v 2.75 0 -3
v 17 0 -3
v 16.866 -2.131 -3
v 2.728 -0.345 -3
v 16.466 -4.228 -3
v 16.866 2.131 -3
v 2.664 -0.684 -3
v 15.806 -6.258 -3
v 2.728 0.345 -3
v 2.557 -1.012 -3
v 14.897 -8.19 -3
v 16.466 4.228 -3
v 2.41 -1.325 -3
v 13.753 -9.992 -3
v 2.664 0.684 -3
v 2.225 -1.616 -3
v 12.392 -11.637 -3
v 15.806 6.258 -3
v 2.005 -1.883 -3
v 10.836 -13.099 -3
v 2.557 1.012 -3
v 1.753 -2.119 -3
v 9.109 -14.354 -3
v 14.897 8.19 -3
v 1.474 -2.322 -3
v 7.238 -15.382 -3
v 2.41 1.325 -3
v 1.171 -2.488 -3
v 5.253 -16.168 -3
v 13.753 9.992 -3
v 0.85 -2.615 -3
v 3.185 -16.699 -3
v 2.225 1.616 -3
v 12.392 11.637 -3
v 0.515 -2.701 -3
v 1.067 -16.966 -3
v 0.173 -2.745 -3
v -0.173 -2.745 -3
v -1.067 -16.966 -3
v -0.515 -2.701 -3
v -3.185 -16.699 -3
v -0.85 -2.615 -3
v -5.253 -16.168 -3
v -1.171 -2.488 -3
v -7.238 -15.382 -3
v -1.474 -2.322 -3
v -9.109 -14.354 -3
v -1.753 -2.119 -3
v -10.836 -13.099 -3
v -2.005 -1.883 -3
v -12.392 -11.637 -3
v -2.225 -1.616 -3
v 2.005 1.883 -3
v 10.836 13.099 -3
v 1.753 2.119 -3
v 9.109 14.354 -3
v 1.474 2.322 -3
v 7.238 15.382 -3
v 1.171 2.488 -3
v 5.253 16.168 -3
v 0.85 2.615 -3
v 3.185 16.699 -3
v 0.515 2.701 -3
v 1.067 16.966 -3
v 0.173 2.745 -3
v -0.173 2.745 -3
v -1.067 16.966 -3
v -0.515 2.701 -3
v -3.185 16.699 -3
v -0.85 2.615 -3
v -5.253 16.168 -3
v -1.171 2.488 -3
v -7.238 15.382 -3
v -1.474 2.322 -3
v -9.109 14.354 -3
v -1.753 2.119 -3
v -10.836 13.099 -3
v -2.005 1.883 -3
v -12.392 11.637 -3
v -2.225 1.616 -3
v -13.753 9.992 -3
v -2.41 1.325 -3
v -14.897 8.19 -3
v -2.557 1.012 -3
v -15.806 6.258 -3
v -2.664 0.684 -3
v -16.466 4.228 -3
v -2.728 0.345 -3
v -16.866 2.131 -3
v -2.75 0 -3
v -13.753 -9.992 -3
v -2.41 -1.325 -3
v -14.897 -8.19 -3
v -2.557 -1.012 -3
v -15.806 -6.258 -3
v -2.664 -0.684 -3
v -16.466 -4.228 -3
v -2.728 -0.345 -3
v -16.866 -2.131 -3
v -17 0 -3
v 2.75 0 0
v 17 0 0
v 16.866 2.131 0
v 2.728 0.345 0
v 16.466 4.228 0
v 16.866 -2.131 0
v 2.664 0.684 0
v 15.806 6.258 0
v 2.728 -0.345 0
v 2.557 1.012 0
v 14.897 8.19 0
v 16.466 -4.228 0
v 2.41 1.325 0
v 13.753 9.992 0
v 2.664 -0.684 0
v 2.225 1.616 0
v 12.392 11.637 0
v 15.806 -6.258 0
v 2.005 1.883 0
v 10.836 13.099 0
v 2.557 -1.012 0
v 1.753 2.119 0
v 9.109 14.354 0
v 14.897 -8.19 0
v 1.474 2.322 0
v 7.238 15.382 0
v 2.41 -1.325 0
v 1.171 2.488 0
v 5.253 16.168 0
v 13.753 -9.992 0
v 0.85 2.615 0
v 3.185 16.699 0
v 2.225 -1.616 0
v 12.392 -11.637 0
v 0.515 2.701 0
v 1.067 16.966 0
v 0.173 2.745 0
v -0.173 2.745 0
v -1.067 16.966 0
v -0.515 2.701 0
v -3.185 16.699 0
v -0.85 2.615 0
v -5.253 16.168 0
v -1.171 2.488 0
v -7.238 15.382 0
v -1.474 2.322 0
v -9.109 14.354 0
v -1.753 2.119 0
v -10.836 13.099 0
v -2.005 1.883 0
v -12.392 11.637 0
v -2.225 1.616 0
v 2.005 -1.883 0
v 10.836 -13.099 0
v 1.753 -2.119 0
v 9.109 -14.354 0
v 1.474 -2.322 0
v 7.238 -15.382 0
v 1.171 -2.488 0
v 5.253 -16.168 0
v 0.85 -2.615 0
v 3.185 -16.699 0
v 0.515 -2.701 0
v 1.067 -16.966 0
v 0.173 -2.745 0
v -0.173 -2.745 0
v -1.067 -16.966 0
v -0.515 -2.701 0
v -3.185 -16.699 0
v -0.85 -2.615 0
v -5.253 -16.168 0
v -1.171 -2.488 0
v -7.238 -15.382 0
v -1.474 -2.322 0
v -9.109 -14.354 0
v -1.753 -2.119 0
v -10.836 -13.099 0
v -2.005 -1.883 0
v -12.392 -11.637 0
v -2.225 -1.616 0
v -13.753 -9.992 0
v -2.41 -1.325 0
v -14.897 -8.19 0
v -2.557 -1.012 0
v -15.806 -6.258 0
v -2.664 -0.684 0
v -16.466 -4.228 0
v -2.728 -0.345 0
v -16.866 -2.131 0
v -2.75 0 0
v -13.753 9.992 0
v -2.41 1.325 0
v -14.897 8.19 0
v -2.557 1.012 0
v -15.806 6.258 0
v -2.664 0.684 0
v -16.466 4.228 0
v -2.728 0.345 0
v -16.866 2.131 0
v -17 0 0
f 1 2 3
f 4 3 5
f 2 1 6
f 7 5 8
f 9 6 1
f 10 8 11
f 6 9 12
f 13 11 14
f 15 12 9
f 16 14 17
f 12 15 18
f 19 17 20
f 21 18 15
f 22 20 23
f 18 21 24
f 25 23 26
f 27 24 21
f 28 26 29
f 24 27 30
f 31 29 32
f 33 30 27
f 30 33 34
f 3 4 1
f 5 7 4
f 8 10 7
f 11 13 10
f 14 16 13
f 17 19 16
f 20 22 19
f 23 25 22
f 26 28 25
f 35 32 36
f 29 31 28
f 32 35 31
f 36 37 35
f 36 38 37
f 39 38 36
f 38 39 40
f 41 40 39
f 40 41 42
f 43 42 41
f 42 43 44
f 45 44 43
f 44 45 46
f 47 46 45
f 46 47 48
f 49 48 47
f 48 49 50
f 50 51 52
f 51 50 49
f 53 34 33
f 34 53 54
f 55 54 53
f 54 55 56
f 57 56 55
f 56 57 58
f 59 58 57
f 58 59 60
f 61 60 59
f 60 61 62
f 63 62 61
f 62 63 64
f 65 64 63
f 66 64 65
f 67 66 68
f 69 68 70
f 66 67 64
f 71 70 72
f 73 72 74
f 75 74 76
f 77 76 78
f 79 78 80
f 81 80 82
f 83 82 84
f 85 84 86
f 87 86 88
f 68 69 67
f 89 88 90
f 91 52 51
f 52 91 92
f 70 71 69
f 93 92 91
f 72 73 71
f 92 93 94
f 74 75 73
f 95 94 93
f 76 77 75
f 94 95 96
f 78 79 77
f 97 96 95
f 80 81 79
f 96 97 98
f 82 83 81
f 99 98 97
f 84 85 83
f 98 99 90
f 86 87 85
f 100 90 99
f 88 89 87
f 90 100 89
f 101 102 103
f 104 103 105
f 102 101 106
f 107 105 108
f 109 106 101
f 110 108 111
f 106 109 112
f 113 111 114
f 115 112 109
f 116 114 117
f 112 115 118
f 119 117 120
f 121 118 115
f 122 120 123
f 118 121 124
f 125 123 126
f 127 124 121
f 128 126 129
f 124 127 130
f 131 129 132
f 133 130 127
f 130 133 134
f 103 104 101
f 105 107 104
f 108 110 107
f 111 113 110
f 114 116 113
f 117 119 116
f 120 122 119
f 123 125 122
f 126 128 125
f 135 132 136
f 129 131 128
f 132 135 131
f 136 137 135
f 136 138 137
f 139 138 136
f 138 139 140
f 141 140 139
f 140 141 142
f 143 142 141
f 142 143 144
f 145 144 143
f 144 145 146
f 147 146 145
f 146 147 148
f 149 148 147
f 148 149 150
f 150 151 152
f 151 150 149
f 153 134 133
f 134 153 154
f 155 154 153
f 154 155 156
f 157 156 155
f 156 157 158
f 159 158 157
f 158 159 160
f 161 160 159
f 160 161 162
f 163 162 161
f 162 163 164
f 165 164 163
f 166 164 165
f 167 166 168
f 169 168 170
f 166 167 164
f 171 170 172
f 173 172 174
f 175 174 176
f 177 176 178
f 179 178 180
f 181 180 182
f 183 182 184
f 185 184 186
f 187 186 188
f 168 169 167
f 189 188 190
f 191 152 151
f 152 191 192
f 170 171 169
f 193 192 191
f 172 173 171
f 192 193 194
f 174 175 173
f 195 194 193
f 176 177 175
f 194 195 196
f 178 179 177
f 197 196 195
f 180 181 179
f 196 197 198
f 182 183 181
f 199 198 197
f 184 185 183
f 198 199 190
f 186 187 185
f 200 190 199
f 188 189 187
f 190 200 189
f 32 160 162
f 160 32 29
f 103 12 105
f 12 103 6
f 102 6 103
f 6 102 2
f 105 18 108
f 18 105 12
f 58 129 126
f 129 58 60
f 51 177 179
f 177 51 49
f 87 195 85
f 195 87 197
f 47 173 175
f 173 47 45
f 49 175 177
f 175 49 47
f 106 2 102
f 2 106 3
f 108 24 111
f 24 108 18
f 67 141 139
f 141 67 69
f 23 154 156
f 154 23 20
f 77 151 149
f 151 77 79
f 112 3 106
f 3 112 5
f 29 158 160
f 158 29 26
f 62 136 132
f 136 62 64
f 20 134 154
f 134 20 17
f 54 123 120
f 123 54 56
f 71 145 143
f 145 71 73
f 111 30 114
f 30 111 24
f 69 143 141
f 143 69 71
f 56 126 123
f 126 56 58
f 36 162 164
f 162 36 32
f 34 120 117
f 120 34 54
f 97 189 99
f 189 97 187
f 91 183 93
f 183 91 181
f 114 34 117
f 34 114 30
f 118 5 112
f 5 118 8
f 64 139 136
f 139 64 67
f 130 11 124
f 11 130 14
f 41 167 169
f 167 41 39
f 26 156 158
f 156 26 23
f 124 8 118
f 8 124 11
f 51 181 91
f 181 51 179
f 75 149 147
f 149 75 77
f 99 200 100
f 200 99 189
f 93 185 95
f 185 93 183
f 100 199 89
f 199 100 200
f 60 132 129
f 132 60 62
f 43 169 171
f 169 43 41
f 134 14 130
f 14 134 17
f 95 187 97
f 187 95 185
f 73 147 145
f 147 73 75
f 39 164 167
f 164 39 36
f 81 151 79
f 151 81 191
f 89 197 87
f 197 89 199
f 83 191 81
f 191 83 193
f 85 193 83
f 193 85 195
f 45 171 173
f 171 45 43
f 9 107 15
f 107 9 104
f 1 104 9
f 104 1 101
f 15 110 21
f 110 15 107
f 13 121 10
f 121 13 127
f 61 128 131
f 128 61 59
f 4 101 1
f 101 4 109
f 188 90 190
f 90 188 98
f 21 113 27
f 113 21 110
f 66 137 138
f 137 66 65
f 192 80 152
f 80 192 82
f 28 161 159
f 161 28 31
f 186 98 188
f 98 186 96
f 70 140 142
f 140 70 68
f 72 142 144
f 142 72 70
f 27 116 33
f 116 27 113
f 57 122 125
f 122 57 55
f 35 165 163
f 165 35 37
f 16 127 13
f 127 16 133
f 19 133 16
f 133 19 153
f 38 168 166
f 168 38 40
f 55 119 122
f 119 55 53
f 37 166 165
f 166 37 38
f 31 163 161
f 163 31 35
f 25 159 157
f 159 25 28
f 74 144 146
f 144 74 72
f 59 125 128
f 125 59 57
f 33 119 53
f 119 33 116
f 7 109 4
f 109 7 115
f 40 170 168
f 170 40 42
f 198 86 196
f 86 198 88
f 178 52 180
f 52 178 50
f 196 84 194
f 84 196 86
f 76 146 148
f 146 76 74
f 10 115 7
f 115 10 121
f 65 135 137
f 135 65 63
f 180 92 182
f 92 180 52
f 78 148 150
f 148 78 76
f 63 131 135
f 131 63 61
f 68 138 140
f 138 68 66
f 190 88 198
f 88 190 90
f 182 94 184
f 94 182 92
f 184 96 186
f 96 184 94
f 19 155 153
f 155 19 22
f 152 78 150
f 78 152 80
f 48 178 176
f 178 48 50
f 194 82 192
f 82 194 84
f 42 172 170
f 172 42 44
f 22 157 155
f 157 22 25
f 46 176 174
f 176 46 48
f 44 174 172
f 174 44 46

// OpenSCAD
$fn = 50;


difference() {
	union() {
		translate(v = [0, 0, -3.0000000000]) {
			cylinder(h = 3, r = 7.0000000000);
		}
		translate(v = [0, 0, -3.0000000000]) {
			cylinder(h = 3, r = 17.0000000000);
		}
	}
	union() {
		#translate(v = [0, 0, -3]) {
			cylinder(h = 3, r = 2.7500000000);
		}
	}
}
